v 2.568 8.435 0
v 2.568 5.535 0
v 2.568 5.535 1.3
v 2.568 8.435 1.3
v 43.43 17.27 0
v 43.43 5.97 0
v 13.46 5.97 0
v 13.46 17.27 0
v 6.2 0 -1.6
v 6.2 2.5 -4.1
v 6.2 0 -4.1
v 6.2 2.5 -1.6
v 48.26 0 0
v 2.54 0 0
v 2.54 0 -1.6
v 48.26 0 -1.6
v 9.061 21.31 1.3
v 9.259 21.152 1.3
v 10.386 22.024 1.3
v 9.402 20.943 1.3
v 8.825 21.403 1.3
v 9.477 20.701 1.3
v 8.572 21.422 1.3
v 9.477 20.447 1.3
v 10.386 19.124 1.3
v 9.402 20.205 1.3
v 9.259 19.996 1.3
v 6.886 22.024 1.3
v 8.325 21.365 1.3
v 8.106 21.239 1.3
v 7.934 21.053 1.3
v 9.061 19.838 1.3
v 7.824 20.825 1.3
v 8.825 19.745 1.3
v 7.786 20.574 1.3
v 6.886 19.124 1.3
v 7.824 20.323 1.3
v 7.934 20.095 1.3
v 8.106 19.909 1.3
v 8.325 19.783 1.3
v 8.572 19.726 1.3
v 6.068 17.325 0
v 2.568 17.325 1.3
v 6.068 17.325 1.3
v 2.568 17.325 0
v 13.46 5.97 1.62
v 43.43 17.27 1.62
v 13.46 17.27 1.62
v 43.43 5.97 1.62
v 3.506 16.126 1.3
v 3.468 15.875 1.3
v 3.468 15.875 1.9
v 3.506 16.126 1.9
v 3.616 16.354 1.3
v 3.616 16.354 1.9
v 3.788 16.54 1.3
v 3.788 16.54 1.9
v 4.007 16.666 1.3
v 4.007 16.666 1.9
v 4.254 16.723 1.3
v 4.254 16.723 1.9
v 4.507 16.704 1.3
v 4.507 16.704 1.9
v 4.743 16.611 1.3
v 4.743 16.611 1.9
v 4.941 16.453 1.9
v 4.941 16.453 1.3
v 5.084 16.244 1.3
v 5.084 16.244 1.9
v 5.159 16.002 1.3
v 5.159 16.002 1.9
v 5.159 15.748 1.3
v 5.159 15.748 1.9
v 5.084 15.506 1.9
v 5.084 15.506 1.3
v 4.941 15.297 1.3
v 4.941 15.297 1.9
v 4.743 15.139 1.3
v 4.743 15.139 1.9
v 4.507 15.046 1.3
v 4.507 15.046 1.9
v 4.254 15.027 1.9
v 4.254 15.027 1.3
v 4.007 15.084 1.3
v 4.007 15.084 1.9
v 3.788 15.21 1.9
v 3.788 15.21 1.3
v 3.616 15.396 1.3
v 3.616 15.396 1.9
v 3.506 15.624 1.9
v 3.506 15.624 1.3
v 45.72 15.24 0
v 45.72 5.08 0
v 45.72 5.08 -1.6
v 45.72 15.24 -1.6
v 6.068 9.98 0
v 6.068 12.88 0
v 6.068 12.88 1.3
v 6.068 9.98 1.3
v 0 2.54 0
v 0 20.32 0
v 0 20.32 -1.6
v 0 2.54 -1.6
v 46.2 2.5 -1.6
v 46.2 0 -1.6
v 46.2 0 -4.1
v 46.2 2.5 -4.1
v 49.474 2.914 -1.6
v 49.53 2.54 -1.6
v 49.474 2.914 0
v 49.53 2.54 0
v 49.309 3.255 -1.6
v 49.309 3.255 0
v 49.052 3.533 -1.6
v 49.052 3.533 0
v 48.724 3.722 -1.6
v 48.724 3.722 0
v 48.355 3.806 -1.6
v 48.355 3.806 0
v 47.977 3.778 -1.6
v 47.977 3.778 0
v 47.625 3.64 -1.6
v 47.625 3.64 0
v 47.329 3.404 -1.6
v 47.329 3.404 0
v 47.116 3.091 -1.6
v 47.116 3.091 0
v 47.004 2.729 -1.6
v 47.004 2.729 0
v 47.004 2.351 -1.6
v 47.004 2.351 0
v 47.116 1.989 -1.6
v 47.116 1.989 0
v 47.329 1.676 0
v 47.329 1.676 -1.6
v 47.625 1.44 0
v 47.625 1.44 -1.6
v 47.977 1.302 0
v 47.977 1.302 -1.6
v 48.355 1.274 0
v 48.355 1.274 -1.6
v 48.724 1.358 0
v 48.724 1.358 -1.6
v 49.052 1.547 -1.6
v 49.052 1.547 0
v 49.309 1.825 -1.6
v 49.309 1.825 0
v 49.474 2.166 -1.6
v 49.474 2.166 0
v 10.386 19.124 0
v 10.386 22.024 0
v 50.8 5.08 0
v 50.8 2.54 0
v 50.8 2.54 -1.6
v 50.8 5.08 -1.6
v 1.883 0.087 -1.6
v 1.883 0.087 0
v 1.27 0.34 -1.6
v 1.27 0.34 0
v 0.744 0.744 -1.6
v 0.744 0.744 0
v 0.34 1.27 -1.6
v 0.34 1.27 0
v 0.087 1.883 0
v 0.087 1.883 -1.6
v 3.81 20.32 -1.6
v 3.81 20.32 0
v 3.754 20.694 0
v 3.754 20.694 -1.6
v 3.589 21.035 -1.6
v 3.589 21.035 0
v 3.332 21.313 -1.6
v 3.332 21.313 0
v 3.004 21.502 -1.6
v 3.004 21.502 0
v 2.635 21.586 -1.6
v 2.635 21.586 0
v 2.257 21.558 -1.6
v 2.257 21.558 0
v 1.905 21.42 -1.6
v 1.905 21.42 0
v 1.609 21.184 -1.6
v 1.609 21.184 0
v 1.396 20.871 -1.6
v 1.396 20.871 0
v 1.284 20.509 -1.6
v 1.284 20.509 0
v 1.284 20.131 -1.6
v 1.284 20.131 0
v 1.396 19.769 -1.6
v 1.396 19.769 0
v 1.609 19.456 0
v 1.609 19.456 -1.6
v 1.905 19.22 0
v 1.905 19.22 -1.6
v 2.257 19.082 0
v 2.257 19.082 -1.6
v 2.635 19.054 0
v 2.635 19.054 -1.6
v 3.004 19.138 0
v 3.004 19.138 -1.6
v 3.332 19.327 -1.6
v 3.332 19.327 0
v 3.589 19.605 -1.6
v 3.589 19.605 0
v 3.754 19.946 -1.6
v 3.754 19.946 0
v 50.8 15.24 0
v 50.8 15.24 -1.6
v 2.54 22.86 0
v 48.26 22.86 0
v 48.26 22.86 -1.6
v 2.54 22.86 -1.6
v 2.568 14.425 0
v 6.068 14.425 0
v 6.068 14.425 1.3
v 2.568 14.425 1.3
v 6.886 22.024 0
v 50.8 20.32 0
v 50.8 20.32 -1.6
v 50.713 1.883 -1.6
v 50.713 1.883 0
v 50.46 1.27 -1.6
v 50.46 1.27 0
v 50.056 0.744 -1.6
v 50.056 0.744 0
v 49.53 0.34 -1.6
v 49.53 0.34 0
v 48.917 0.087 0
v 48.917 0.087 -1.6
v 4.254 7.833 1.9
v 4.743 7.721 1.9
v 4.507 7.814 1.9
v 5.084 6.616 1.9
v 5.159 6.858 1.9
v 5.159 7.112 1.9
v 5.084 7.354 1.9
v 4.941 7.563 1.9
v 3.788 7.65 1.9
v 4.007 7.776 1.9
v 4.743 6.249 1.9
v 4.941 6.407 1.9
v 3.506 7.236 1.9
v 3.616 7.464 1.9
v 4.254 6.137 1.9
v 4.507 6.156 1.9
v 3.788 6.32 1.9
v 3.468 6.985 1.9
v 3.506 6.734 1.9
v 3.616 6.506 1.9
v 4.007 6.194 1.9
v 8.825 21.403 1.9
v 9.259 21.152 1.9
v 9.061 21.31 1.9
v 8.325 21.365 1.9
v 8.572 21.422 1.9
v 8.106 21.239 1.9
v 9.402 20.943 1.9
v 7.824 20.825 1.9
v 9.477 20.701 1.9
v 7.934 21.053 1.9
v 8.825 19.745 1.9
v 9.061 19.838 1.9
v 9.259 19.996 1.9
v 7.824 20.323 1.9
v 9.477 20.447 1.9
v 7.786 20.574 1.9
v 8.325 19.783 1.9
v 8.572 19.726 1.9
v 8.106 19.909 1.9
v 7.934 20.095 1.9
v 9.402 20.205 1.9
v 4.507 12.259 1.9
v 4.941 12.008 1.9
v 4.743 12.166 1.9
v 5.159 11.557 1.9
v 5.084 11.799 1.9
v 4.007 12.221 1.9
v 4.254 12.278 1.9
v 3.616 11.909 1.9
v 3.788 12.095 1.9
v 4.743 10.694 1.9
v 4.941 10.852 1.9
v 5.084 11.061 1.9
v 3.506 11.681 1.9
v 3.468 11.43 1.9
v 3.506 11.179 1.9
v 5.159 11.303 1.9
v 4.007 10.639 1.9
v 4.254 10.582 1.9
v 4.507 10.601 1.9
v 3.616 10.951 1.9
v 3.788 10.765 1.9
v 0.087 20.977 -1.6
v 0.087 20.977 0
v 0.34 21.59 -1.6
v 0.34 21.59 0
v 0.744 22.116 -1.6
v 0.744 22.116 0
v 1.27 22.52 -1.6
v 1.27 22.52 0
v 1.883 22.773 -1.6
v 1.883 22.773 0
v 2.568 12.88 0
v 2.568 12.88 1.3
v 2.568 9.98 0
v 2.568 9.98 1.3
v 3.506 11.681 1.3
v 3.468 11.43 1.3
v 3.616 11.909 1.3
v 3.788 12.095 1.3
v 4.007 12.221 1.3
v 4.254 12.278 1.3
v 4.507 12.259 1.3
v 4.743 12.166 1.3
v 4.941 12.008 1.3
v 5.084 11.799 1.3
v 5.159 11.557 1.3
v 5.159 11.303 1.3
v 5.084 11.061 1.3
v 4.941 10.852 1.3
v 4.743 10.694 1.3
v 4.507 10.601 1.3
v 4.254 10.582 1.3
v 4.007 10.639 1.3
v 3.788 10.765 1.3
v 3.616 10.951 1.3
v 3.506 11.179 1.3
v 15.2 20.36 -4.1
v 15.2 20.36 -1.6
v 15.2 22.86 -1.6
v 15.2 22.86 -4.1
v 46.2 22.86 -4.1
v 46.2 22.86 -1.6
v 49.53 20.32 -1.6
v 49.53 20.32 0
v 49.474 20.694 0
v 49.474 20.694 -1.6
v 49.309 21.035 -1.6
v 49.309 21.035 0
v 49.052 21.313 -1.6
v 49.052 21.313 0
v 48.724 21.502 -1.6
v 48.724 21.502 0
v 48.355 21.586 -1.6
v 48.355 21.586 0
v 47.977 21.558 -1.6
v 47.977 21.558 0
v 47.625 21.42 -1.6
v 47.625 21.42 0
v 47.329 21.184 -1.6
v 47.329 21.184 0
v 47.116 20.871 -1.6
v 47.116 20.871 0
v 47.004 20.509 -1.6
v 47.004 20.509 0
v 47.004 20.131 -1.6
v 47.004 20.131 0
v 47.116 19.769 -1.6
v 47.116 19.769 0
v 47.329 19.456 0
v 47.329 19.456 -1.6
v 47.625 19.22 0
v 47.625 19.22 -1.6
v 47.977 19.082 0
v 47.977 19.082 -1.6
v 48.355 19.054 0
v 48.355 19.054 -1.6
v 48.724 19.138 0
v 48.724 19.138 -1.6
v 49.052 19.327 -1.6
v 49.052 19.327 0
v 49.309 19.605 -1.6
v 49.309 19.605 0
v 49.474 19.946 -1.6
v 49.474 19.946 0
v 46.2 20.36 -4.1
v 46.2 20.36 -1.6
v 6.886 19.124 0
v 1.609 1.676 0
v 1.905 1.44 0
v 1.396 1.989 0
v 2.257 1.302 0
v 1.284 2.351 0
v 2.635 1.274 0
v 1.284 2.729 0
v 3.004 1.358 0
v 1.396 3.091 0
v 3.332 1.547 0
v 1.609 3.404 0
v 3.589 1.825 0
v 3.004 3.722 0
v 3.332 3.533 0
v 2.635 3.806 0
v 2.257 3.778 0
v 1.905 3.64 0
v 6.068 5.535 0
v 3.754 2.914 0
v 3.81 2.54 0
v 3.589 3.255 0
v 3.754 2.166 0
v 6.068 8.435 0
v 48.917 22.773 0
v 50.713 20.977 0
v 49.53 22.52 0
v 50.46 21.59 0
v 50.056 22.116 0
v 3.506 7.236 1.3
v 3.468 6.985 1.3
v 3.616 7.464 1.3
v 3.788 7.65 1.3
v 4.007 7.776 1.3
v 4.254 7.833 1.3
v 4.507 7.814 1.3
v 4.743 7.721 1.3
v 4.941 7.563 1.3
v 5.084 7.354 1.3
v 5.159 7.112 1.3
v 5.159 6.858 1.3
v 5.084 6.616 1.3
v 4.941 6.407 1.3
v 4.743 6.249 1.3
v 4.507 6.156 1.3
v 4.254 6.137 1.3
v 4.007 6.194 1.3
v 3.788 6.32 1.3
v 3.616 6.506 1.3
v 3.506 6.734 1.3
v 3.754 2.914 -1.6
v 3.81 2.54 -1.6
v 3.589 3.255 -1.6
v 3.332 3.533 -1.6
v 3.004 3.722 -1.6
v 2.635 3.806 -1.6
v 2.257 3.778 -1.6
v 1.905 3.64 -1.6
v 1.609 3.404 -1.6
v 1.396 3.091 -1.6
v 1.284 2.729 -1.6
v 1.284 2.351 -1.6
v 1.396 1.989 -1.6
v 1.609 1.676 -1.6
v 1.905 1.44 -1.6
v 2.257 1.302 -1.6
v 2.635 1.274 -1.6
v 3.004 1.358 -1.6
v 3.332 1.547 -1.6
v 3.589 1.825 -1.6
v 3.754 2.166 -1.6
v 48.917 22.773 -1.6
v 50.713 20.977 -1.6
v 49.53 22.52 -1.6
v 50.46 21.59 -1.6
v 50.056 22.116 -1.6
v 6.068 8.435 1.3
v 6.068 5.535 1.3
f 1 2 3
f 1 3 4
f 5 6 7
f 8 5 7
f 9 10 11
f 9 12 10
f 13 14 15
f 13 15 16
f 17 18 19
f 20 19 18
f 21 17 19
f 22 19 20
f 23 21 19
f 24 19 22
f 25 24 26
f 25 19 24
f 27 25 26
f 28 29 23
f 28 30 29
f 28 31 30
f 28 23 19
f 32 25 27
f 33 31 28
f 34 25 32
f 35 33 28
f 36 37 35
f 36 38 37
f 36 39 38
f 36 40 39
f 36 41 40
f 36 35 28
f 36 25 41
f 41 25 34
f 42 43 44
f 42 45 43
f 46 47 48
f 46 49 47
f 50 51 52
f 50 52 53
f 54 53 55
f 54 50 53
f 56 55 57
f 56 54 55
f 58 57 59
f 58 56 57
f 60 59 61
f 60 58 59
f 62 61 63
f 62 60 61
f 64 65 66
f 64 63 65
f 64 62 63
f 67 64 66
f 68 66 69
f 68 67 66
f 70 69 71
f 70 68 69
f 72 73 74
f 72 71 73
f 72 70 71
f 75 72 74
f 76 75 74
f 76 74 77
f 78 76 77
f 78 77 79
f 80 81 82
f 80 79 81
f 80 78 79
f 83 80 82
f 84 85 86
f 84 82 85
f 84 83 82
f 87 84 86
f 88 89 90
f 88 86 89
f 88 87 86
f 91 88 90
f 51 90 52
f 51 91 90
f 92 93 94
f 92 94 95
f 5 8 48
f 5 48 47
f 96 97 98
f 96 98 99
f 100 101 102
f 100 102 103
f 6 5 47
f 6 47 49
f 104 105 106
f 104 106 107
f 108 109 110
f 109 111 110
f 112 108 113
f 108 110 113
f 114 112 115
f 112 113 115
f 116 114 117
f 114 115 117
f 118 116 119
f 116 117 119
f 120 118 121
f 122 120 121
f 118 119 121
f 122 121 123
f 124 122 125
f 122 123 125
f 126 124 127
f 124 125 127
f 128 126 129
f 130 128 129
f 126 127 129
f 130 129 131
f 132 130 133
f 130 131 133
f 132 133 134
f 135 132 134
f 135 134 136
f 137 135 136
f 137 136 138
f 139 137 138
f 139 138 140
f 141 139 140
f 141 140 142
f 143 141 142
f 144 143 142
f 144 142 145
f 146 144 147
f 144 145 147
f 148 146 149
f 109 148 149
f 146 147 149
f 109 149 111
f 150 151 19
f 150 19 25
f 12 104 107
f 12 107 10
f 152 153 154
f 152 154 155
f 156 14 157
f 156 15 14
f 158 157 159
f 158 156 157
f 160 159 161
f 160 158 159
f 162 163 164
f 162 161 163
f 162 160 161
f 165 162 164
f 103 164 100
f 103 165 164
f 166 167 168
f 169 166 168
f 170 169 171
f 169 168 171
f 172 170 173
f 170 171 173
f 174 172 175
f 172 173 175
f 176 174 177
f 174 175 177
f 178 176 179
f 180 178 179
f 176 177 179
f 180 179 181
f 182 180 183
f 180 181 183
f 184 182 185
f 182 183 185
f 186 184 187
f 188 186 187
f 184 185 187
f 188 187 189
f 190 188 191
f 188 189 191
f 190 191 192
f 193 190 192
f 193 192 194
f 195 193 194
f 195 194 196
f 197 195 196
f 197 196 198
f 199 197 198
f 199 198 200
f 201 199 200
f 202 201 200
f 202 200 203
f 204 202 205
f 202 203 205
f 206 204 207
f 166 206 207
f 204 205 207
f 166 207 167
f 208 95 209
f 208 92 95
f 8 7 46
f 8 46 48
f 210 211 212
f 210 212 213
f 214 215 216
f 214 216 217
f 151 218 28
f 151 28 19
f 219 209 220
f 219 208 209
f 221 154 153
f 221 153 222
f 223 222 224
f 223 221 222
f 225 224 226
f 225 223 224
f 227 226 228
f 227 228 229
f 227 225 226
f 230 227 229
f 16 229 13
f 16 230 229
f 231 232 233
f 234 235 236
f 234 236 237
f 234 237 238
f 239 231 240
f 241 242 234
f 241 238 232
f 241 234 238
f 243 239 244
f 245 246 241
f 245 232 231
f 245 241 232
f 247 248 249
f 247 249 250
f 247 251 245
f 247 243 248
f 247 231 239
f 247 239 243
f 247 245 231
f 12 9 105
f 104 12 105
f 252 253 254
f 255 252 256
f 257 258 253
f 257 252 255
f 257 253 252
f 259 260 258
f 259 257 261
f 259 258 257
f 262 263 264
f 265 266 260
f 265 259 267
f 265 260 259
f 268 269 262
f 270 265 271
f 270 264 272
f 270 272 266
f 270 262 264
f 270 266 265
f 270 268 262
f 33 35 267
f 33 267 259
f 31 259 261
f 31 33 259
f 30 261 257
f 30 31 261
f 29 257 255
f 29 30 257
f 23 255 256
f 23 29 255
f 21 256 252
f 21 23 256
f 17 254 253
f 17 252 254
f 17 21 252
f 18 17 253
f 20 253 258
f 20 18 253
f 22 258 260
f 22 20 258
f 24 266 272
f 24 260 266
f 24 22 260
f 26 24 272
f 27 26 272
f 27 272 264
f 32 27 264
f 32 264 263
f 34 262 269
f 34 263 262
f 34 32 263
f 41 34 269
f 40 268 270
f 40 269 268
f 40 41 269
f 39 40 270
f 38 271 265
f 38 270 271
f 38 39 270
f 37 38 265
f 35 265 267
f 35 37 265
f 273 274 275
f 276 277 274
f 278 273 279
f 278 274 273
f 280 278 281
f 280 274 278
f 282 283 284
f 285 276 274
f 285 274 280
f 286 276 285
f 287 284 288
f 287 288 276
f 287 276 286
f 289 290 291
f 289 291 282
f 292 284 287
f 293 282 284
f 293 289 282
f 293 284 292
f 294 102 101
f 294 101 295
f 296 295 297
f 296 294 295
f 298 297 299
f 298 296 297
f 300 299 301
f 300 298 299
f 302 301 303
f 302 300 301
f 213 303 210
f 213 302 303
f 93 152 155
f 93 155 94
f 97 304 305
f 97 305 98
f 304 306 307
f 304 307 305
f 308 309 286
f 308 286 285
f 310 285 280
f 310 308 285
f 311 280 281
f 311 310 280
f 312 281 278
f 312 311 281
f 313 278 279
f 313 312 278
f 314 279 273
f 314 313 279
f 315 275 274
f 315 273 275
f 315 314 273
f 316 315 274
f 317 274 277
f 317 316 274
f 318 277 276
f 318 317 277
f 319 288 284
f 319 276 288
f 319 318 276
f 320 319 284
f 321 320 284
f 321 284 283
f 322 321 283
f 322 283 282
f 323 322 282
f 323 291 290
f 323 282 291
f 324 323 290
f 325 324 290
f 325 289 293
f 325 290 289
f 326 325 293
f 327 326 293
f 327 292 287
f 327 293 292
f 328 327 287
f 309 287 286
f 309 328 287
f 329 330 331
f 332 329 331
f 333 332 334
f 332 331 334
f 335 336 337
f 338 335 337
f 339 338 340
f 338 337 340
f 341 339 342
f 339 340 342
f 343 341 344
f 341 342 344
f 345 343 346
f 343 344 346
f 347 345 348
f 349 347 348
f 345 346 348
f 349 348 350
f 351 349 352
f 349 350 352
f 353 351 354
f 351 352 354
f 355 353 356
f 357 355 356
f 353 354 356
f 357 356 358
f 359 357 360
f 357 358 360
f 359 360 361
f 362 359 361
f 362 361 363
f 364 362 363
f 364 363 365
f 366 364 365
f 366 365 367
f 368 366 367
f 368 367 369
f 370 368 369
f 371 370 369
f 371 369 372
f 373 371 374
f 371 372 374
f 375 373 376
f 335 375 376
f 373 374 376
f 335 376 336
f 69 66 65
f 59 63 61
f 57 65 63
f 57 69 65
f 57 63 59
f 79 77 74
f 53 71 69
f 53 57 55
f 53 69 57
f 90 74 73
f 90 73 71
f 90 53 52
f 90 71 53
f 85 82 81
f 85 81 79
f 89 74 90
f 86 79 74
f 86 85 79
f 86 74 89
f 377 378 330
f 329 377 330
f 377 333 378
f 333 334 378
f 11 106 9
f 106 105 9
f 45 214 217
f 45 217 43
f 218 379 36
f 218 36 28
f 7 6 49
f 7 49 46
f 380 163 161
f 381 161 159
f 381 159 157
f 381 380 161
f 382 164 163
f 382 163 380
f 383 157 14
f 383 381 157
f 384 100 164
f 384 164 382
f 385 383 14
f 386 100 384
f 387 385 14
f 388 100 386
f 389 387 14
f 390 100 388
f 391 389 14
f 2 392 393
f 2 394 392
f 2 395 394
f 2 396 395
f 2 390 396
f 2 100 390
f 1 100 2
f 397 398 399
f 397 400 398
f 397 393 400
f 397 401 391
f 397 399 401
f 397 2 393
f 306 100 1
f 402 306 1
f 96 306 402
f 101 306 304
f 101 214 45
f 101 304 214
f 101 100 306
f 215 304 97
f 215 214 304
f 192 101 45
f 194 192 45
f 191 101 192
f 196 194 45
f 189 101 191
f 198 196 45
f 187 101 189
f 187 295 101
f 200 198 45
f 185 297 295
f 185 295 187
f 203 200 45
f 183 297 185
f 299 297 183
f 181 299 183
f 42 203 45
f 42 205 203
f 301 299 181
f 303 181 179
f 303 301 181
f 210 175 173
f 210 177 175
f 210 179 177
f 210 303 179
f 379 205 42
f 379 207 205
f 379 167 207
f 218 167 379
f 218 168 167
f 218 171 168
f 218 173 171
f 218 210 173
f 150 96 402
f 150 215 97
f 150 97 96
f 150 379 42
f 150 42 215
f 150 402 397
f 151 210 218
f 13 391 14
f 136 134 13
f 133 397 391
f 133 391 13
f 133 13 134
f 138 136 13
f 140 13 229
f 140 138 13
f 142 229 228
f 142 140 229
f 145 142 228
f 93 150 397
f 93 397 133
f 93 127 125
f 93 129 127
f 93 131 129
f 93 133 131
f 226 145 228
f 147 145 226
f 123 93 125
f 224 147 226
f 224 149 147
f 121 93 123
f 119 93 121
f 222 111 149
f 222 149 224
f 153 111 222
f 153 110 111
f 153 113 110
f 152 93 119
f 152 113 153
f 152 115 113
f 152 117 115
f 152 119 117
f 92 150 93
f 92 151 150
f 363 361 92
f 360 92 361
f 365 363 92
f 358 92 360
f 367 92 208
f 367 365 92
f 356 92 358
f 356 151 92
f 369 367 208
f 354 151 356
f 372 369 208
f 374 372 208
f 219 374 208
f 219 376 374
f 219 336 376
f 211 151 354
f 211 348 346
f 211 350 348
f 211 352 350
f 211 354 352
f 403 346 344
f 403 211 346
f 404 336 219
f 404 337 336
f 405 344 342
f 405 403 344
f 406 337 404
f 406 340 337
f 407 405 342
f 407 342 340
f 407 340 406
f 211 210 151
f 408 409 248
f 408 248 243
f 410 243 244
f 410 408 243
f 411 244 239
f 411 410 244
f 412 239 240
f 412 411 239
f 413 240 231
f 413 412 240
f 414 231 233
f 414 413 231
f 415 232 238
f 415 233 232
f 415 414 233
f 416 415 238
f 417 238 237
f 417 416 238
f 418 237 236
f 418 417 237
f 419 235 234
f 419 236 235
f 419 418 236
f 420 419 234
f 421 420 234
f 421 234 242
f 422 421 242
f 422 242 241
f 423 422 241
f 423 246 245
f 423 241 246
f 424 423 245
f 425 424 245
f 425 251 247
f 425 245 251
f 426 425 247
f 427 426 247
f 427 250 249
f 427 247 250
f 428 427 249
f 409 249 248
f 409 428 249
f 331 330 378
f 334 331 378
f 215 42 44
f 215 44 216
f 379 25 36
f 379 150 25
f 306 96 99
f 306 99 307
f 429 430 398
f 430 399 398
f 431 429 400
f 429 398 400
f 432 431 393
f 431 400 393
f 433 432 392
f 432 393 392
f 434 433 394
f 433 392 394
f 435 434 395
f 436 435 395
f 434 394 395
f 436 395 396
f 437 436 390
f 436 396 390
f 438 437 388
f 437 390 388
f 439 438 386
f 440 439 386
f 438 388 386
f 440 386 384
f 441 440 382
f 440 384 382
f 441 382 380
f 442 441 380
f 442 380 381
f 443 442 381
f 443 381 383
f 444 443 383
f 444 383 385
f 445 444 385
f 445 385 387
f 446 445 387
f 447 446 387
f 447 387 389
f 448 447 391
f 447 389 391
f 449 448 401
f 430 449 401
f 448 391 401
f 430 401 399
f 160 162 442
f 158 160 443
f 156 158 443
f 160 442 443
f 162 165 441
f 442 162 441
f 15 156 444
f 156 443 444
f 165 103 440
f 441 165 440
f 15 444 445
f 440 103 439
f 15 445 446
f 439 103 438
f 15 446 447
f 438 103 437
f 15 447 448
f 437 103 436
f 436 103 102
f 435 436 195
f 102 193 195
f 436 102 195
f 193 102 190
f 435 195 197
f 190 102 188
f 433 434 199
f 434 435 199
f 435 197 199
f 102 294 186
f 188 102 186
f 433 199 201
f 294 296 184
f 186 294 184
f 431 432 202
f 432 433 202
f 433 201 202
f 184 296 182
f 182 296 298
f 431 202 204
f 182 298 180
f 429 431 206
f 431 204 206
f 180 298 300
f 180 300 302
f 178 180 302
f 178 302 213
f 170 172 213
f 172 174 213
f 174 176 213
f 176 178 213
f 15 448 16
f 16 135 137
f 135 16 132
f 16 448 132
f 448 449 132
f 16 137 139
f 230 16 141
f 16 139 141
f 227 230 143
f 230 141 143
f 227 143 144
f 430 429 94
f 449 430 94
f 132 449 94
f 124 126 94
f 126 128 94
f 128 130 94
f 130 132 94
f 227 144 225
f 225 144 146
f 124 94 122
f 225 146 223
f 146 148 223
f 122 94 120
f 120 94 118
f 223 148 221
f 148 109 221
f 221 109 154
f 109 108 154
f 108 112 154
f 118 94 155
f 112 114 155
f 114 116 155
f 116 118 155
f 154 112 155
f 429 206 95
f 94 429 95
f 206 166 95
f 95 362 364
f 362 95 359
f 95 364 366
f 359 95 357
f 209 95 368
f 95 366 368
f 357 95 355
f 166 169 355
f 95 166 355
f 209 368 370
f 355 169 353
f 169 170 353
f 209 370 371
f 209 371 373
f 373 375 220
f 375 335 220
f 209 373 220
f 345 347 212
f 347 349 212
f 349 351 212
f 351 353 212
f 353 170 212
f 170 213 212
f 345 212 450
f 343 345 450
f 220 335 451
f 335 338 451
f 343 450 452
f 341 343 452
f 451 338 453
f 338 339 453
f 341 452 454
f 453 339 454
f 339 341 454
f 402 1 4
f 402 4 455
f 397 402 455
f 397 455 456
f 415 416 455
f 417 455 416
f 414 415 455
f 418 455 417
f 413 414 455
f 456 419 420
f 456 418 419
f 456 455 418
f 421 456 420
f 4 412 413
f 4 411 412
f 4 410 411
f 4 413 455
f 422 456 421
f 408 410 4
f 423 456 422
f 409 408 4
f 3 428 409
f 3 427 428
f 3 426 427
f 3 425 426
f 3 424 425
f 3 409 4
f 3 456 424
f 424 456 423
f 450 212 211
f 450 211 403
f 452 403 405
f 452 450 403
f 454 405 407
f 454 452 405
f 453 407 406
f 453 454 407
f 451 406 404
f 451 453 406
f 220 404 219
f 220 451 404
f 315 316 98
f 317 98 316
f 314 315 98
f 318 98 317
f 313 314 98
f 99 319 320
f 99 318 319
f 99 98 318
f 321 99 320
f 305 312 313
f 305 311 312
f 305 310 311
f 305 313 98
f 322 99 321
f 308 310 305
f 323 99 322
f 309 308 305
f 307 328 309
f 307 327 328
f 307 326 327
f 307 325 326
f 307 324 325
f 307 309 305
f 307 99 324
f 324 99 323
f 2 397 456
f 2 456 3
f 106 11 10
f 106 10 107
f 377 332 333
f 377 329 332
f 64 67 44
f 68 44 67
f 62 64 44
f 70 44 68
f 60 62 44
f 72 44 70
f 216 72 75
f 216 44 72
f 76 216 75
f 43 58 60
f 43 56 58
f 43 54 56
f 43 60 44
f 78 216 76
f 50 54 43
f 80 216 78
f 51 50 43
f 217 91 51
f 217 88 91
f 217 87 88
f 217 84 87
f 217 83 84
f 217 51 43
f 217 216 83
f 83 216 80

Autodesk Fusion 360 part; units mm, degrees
sketch "PCB" plane through (0, 0, 0) normal (0, 0, 1) x (1, 0, 0)
  line L0 (0, 0) -> (50.8, 0)
  line L1 (50.8, 0) -> (50.8, 22.86)
  line L2 (50.8, 22.86) -> (0, 22.86)
  line L3 (0, 22.86) -> (0, 0)
  circle A0 centre (2.54, 2.54) radius 1.27
  line L4 (0, 11.43) -> (51, 11.43) construction
  circle A1 centre (2.54, 20.32) radius 1.27
  line L5 (25.4, 22.86) -> (25.4, 0) construction
  circle A2 centre (48.26, 20.32) radius 1.27
  circle A3 centre (48.26, 2.54) radius 1.27
  line L6 (45.72, 15.24) -> (50.8, 15.24)
  line L7 (50.8, 15.24) -> (50.8, 5.08)
  line L8 (50.8, 5.08) -> (45.72, 5.08)
  line L9 (45.72, 5.08) -> (45.72, 15.24)
  dimension "d1" = 50.8
  dimension "d2" = 22.86
  dimension "d3" = 2.54
  dimension "d4" = 2.54
  dimension "d5" = 2.54
  dimension "d9" = 5.08
  dimension "d10" = 10.16
  dimension "d11" = 5.08
extrude "Extrude1" add sketch "PCB" against normal blind 1.6 contours L0 L1 L2 L3 L6 L8 L9 makes body 1
fillet "Fillet1" radius 2.54 4 edges at (0, 22.86, -0.8) (0, 0, -0.8) (50.8, 0, -0.8) (50.8, 22.86, -0.8) on bodies 1
sketch "OLED" plane through (0, 0, 0) normal (0, 0, 1) x (-1, 0, 0)
  circle A0 centre (-2.54, -2.54) radius 1.27
  circle A1 centre (-2.54, -20.32) radius 1.27
  circle A2 centre (-48.26, -2.54) radius 1.27
  circle A3 centre (-48.26, -20.32) radius 1.27
  arc A4 (-50.8, -20.32) -> (-48.26, -22.86) centre (-48.26, -20.32) ccw
  line L0 (-48.26, -22.86) -> (-2.54, -22.86)
  arc A5 (-2.54, -22.86) -> (0, -20.32) centre (-2.54, -20.32) ccw
  line L1 (0, -20.32) -> (0, -2.54)
  arc A6 (0, -2.54) -> (-2.54, 0) centre (-2.54, -2.54) ccw
  line L2 (-2.54, 0) -> (-48.26, 0)
  arc A7 (-48.26, 0) -> (-50.8, -2.54) centre (-48.26, -2.54) ccw
  line L3 (-50.8, -2.54) -> (-50.8, -5.08)
  line L4 (-50.8, -5.08) -> (-45.72, -5.08)
  line L5 (-45.72, -5.08) -> (-45.72, -15.24)
  line L6 (-45.72, -15.24) -> (-50.8, -15.24)
  line L7 (-50.8, -15.24) -> (-50.8, -20.32)
  line L8 (-13.46, -17.27) -> (-43.43, -17.27)
  line L9 (-43.43, -17.27) -> (-43.43, -5.97)
  line L10 (-43.43, -5.97) -> (-13.46, -5.97)
  line L11 (-13.46, -5.97) -> (-13.46, -17.27)
  dimension "d12" = 29.97
  dimension "d13" = 11.3
  dimension "d14" = 5.97
  dimension "d15" = 13.46
extrude "Extrude2" add sketch "OLED" along normal blind 1.62 separate body contours L8 L9 L10 L11 makes body 2
sketch "buttons" plane through (0, 0, 0) normal (0, 0, 1) x (-1, 0, 0)
  circle A0 centre (-2.54, -2.54) radius 1.27
  circle A1 centre (-2.54, -20.32) radius 1.27
  circle A2 centre (-48.26, -2.54) radius 1.27
  circle A3 centre (-48.26, -20.32) radius 1.27
  arc A4 (-50.8, -20.32) -> (-48.26, -22.86) centre (-48.26, -20.32) ccw
  line L0 (-48.26, -22.86) -> (-2.54, -22.86)
  arc A5 (-2.54, -22.86) -> (0, -20.32) centre (-2.54, -20.32) ccw
  line L1 (0, -20.32) -> (0, -2.54)
  arc A6 (0, -2.54) -> (-2.54, 0) centre (-2.54, -2.54) ccw
  line L2 (-2.54, 0) -> (-48.26, 0)
  arc A7 (-48.26, 0) -> (-50.8, -2.54) centre (-48.26, -2.54) ccw
  line L3 (-50.8, -2.54) -> (-50.8, -5.08)
  line L4 (-50.8, -5.08) -> (-45.72, -5.08)
  line L5 (-45.72, -5.08) -> (-45.72, -15.24)
  line L6 (-45.72, -15.24) -> (-50.8, -15.24)
  line L7 (-50.8, -15.24) -> (-50.8, -20.32)
  line L8 (-6.068, -5.535) -> (-2.568, -5.535)
  line L9 (-2.568, -5.535) -> (-2.568, -8.435)
  line L10 (-2.568, -8.435) -> (-6.068, -8.435)
  line L11 (-6.068, -8.435) -> (-6.068, -5.535)
  line L12 (-6.068, -5.535) -> (-2.568, -8.435) construction
  line L13 (-2.568, -5.535) -> (-6.068, -8.435) construction
  line L14 (-6.068, -9.98) -> (-2.568, -9.98)
  line L15 (-2.568, -9.98) -> (-2.568, -12.88)
  line L16 (-2.568, -12.88) -> (-6.068, -12.88)
  line L17 (-6.068, -12.88) -> (-6.068, -9.98)
  line L18 (-6.068, -9.98) -> (-2.568, -12.88) construction
  line L19 (-2.568, -9.98) -> (-6.068, -12.88) construction
  line L20 (-6.068, -14.425) -> (-2.568, -14.425)
  line L21 (-2.568, -14.425) -> (-2.568, -17.325)
  line L22 (-2.568, -17.325) -> (-6.068, -17.325)
  line L23 (-6.068, -17.325) -> (-6.068, -14.425)
  line L24 (-6.068, -14.425) -> (-2.568, -17.325) construction
  line L25 (-2.568, -14.425) -> (-6.068, -17.325) construction
  line L26 (-10.386, -19.124) -> (-6.886, -19.124)
  line L27 (-6.886, -19.124) -> (-6.886, -22.024)
  line L28 (-6.886, -22.024) -> (-10.386, -22.024)
  line L29 (-10.386, -22.024) -> (-10.386, -19.124)
  line L30 (-10.386, -19.124) -> (-6.886, -22.024) construction
  line L31 (-6.886, -19.124) -> (-10.386, -22.024) construction
  point P0 (-4.318, -6.985)
  point P1 (-4.318, -11.43)
  point P2 (-4.318, -15.875)
  point P3 (-8.636, -20.574)
  dimension "d18" = 3.5
  dimension "d19" = 2.9
  dimension "d20" = 4.318
  dimension "d21" = 6.985
  dimension "d22" = 3.5
  dimension "d23" = 2.9
  dimension "d24" = 4.318
  dimension "d25" = 11.43
  dimension "d26" = 3.5
  dimension "d27" = 2.9
  dimension "d28" = 4.318
  dimension "d29" = 15.875
  dimension "d37" = 3.5
  dimension "d38" = 2.9
  dimension "d39" = 8.636
  dimension "d41" = 20.574
extrude "Extrude3" add sketch "buttons" along normal blind 1.3 contours L8 L9 L10 L11 | L14 L15 L16 L17 | L20 L21 L22 L23 | L26 L27 L28 L29 bodies 1
sketch "button actuators" plane through (0, 0, 1.3) normal (0, 0, 1) x (-1, 0, 0)
  line L0 (-6.068, -17.325) -> (-2.568, -17.325)
  line L1 (-2.568, -17.325) -> (-2.568, -14.425)
  line L2 (-2.568, -14.425) -> (-6.068, -14.425)
  line L3 (-6.068, -14.425) -> (-6.068, -17.325)
  circle A0 centre (-4.318, -15.875) radius 0.85
  line L4 (-6.068, -12.88) -> (-2.568, -12.88)
  line L5 (-2.568, -12.88) -> (-2.568, -9.98)
  line L6 (-2.568, -9.98) -> (-6.068, -9.98)
  line L7 (-6.068, -9.98) -> (-6.068, -12.88)
  line L8 (-6.068, -8.435) -> (-2.568, -8.435)
  line L9 (-2.568, -8.435) -> (-2.568, -5.535)
  line L10 (-2.568, -5.535) -> (-6.068, -5.535)
  line L11 (-6.068, -5.535) -> (-6.068, -8.435)
  circle A1 centre (-4.318, -11.43) radius 0.85
  circle A2 centre (-4.318, -6.985) radius 0.85
  line L12 (-10.386, -22.024) -> (-6.886, -22.024)
  line L13 (-6.886, -22.024) -> (-6.886, -19.124)
  line L14 (-6.886, -19.124) -> (-10.386, -19.124)
  line L15 (-10.386, -19.124) -> (-10.386, -22.024)
  circle A3 centre (-8.636, -20.574) radius 0.85
  point P0 (-8.636, -20.574)
  dimension "d32" = 1.7
  dimension "d33" = 1.7
  dimension "d34" = 1.7
  dimension "d42" = 1.7
extrude "Extrude4" add sketch "button actuators" along normal blind 0.6 contours A0 | A1 | A2 | A3 bodies 1
sketch "header strips" plane through (0, 0, -1.6) normal (0, 0, -1) x (1, 0, 0)
  arc A0 (48.26, -22.86) -> (50.8, -20.32) centre (48.26, -20.32) ccw
  line L0 (50.8, -20.32) -> (50.8, -15.24)
  line L1 (50.8, -15.24) -> (45.72, -15.24)
  line L2 (45.72, -15.24) -> (45.72, -5.08)
  line L3 (45.72, -5.08) -> (50.8, -5.08)
  line L4 (50.8, -5.08) -> (50.8, -2.54)
  arc A1 (50.8, -2.54) -> (48.26, 0) centre (48.26, -2.54) ccw
  line L5 (48.26, 0) -> (2.54, 0)
  arc A2 (2.54, 0) -> (0, -2.54) centre (2.54, -2.54) ccw
  line L6 (0, -2.54) -> (0, -20.32)
  arc A3 (0, -20.32) -> (2.54, -22.86) centre (2.54, -20.32) ccw
  line L7 (2.54, -22.86) -> (48.26, -22.86)
  circle A4 centre (2.54, -2.54) radius 1.27
  circle A5 centre (2.54, -20.32) radius 1.27
  circle A6 centre (48.26, -2.54) radius 1.27
  circle A7 centre (48.26, -20.32) radius 1.27
  line L8 (6.2, 0) -> (46.2, 0)
  line L9 (46.2, 0) -> (46.2, -2.5)
  line L10 (46.2, -2.5) -> (6.2, -2.5)
  line L11 (6.2, -2.5) -> (6.2, 0)
  line L12 (15.2, -22.86) -> (46.2, -22.86)
  line L13 (46.2, -22.86) -> (46.2, -20.36)
  line L14 (46.2, -20.36) -> (15.2, -20.36)
  line L15 (15.2, -20.36) -> (15.2, -22.86)
  dimension "d43" = 40
  dimension "d44" = 2.5
  dimension "d46" = 31
  dimension "d47" = 2.5
  dimension "d51" = 4.6
  dimension "d52" = 4.6
extrude "Extrude5" add sketch "header strips" along normal blind 2.5 separate body contours L7 L12 L13 L14 L15 | L5 L8 L9 L10 L11 makes body 3 at (32.8667, 0, -2.4333) makes body 4 at (35.8667, 22.0267, -1.6)
